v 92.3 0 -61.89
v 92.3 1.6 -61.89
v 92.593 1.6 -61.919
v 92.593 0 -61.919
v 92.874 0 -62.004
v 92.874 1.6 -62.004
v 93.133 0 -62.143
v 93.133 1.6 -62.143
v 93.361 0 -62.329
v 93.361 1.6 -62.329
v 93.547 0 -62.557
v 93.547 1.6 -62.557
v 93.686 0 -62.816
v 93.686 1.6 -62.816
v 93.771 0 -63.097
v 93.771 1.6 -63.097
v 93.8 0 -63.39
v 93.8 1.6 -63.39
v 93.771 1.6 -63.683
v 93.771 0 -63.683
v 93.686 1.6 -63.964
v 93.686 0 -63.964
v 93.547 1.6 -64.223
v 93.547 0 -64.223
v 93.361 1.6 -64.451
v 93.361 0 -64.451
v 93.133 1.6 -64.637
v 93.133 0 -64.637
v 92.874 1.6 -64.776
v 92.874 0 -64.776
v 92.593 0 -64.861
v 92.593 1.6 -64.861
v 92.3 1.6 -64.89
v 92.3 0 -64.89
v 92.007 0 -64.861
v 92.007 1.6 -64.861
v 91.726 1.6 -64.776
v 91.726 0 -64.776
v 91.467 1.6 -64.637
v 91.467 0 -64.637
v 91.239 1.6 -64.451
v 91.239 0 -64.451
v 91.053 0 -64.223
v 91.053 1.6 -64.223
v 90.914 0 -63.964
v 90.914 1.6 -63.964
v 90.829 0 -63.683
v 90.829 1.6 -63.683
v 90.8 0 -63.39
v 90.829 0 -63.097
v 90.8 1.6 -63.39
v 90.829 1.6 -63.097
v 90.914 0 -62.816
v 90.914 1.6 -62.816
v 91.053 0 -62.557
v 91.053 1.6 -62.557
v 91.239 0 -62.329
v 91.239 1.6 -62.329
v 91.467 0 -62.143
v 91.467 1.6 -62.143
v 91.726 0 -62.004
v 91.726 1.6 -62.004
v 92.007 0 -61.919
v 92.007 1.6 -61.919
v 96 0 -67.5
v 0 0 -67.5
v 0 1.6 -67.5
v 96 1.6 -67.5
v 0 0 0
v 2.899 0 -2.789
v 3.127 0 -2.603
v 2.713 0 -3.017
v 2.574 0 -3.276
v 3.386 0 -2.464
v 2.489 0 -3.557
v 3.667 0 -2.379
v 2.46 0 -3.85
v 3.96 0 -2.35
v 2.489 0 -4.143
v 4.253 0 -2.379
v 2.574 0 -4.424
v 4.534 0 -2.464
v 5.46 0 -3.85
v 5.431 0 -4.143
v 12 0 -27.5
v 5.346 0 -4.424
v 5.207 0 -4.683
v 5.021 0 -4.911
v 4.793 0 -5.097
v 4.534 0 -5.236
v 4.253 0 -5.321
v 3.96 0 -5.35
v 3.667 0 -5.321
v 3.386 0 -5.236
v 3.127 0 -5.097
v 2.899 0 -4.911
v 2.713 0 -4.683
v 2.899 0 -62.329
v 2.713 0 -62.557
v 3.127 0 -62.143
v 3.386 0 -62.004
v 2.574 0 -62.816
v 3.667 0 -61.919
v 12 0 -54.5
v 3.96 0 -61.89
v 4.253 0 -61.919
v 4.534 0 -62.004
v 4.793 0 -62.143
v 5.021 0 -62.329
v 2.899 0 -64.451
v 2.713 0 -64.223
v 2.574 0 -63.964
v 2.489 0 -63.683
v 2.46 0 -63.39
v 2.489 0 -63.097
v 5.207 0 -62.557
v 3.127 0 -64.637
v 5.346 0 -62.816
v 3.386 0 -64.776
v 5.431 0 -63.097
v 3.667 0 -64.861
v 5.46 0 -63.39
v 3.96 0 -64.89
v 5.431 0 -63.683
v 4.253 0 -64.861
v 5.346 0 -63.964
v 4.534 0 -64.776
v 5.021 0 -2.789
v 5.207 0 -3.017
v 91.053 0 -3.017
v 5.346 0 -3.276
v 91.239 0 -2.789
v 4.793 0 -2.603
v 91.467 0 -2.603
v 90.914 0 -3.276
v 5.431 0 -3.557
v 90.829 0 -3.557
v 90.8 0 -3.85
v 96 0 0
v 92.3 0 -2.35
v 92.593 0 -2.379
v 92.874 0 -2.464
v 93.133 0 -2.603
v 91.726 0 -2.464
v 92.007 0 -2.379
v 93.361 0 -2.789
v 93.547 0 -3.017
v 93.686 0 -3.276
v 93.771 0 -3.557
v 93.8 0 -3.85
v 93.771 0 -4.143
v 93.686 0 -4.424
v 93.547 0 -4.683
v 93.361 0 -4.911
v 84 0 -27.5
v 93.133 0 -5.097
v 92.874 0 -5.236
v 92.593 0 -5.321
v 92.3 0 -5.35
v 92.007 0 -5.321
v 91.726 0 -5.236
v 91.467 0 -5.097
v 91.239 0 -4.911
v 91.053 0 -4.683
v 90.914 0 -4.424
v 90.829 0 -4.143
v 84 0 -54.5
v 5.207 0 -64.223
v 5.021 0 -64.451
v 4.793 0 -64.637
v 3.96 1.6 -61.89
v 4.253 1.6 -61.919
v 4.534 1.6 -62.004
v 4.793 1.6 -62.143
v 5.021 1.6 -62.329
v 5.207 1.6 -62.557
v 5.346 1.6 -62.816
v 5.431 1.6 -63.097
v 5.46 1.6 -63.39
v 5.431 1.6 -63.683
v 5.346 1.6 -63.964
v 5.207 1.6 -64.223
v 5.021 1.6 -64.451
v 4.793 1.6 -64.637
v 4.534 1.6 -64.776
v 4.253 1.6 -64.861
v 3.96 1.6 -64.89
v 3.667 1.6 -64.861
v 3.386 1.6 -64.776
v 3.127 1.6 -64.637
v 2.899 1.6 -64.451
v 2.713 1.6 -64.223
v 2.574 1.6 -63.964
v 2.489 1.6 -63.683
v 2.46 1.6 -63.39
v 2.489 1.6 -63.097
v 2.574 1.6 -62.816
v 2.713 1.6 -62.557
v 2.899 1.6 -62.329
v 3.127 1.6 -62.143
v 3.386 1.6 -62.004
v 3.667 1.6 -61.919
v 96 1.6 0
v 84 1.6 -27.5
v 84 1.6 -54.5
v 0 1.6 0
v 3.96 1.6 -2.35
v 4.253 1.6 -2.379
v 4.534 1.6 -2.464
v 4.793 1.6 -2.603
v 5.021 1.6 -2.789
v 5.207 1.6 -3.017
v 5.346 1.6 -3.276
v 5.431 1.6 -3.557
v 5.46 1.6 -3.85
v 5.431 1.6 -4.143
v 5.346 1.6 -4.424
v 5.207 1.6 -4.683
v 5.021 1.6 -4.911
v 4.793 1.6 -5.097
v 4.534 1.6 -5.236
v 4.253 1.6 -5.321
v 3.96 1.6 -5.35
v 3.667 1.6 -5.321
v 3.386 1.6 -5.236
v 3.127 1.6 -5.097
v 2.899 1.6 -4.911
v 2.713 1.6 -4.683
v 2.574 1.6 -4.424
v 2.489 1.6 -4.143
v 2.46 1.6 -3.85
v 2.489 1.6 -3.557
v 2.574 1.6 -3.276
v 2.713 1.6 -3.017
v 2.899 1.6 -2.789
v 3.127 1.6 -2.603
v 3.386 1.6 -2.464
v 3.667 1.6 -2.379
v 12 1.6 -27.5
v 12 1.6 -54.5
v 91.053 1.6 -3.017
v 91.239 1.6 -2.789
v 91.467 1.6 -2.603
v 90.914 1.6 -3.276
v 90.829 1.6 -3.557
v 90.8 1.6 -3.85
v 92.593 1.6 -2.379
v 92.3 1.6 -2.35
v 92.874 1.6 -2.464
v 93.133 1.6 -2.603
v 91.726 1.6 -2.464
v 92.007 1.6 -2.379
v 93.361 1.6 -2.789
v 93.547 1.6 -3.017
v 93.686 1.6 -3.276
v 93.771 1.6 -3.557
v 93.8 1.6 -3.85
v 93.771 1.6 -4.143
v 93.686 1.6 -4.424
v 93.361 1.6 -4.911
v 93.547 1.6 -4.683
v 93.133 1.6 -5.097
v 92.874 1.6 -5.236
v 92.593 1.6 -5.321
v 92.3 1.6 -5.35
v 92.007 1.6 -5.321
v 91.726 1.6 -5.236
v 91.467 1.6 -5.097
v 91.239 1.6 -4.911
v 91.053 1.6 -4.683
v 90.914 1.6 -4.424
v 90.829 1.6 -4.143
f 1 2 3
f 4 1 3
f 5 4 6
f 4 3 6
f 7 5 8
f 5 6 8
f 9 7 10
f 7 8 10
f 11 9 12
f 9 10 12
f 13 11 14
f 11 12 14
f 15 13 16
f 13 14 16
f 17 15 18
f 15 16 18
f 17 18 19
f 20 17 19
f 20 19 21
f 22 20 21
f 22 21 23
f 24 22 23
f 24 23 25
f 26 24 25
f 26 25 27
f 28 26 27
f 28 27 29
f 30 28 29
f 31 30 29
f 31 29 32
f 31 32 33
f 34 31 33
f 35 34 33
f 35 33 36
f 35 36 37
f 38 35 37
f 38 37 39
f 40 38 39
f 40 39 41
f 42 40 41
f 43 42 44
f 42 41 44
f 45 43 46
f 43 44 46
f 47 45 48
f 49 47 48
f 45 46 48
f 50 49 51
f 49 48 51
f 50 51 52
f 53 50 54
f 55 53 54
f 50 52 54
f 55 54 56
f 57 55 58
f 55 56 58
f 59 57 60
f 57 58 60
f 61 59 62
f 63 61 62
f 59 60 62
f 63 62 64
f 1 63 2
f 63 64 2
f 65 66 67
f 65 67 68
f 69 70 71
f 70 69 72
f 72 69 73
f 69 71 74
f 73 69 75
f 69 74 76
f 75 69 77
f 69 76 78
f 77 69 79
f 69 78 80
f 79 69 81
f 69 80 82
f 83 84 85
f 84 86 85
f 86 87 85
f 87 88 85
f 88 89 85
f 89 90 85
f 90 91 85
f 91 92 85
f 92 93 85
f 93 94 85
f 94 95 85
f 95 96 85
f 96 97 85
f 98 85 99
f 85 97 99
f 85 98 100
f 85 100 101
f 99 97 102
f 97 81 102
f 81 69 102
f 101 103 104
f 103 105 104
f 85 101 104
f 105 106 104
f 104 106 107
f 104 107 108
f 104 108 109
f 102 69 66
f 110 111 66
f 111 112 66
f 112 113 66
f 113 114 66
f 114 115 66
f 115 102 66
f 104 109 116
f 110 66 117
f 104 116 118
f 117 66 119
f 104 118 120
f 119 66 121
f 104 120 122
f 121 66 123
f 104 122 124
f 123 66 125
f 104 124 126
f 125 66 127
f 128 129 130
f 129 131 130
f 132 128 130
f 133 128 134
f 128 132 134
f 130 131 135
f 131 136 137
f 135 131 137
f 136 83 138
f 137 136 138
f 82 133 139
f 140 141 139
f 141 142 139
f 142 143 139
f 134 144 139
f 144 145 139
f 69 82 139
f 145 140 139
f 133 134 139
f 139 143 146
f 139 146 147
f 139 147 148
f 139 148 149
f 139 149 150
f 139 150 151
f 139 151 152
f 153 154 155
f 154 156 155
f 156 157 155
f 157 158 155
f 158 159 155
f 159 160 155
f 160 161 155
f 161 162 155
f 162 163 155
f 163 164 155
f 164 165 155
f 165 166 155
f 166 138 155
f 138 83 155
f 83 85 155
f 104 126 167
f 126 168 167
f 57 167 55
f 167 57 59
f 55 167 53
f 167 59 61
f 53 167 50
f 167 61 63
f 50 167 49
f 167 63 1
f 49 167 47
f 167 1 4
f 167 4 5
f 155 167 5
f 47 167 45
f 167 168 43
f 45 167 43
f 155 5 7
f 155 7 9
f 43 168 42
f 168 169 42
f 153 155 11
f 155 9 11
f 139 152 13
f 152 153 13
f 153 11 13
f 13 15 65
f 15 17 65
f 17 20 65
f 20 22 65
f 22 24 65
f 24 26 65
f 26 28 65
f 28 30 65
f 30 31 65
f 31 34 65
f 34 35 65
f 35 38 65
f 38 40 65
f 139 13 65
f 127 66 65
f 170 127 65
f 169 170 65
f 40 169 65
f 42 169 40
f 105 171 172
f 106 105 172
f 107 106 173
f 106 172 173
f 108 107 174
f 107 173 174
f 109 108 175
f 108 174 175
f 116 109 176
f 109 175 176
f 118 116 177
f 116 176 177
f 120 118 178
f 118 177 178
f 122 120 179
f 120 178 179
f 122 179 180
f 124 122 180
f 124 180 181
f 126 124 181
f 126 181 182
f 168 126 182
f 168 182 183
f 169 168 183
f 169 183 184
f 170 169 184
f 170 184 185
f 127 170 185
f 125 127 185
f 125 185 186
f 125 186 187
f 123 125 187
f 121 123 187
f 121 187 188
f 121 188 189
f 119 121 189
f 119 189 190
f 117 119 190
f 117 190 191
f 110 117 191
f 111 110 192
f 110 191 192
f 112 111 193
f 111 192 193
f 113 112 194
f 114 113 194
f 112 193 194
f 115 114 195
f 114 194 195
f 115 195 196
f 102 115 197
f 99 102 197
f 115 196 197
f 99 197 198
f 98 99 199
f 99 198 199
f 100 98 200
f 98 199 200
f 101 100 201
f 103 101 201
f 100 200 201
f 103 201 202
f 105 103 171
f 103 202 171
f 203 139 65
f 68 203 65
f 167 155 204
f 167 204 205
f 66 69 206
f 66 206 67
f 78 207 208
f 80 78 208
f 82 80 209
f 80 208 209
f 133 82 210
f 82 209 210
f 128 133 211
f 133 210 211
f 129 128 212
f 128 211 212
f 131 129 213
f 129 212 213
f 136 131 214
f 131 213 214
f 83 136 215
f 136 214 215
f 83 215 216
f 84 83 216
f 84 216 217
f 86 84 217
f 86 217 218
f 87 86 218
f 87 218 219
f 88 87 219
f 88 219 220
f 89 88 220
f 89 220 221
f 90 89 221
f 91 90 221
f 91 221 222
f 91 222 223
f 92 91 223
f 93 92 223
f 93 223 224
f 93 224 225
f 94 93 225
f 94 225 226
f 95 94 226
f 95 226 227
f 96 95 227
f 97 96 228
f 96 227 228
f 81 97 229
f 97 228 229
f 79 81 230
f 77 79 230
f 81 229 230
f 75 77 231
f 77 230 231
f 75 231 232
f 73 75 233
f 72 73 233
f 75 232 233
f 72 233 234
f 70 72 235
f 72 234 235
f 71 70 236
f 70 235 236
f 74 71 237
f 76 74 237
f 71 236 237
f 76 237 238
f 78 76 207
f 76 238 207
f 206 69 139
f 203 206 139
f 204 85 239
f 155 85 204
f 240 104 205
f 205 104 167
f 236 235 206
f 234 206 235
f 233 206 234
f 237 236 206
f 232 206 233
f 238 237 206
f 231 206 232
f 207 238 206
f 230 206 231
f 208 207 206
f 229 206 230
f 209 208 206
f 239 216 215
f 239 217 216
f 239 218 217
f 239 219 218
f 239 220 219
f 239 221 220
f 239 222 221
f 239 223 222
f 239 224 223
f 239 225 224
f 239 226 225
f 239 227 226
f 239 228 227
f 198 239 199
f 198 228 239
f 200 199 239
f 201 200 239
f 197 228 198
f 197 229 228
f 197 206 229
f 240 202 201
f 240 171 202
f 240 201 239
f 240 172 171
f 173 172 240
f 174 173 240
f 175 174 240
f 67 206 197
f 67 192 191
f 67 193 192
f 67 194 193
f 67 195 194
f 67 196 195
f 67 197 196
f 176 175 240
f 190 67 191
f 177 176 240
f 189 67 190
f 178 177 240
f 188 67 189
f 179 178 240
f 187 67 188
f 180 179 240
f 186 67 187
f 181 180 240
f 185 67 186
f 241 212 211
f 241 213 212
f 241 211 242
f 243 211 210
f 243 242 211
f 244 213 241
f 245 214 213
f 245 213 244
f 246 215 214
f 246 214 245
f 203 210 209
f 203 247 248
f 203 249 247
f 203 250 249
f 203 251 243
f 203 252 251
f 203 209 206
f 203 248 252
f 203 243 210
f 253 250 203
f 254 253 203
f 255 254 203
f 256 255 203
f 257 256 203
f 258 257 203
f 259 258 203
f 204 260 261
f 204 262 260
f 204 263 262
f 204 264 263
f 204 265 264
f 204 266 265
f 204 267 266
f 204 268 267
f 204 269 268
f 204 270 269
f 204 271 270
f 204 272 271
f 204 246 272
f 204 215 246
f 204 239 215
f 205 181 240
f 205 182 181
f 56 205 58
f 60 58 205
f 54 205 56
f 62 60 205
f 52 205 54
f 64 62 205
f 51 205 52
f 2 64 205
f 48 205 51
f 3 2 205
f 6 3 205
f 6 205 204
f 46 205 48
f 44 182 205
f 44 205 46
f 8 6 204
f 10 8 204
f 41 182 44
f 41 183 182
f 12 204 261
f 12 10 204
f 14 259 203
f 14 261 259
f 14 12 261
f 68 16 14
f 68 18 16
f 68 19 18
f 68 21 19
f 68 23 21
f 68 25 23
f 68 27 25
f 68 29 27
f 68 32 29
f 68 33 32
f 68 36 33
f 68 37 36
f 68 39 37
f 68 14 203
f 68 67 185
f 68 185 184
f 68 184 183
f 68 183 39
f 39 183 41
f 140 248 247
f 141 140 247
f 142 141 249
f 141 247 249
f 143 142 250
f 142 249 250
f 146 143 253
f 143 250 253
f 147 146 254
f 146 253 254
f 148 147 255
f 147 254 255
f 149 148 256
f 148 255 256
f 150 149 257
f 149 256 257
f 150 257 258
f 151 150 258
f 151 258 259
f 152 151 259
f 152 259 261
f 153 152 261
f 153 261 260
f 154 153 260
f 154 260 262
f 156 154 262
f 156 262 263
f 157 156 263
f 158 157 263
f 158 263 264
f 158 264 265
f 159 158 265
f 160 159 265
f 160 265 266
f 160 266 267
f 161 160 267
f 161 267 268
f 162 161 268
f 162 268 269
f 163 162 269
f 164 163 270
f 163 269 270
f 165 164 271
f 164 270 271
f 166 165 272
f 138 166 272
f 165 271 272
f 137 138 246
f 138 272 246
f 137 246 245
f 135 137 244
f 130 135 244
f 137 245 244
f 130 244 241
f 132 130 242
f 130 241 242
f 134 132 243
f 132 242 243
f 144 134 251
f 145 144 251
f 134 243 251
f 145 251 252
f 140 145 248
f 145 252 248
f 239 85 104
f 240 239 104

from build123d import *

# Parameters (mm, degrees)
SKETCH1_W               = 96
SKETCH1_H               = 67.5
BOSS_EXTRUDE1_DEPTH     = 1.6
CUT_EXTRUDE1_REACH      = 119.366
SKETCH2_R               = 1.5
CUT_EXTRUDE2_DEPTH      = 118.366136513
CUT_EXTRUDE2_DEPTH_BACK = 118.366136513
SKETCH3_W               = 72
SKETCH3_H               = 27


with BuildPart() as part:
    # Sketch1 → Boss-Extrude1 (new body)
    with BuildSketch(Plane(origin=(0, 0, 0), x_dir=(1, 0, 0), z_dir=(0, 1, 0))):
        with Locations((48, 33.75)):
            Rectangle(SKETCH1_W, SKETCH1_H)
    extrude(amount=BOSS_EXTRUDE1_DEPTH)

    # Sketch2 → Cut-Extrude1 (cut, up to next)
    with BuildSketch(Plane(origin=(0, 1.6, 0), x_dir=(1, 0, 0), z_dir=(0, 1, 0)), mode=Mode.PRIVATE) as cut_extrude1_sk1:
        with Locations(Location((3.96, 3.85, 0), (0, 0, 270))):
            Circle(SKETCH2_R)
    cut_extrude1_tool1 = extrude(cut_extrude1_sk1.sketch, amount=-CUT_EXTRUDE1_REACH, mode=Mode.PRIVATE) & part.part
    # Sketch2 → Cut-Extrude1 (cut, up to next)
    with BuildSketch(Plane(origin=(0, 1.6, 0), x_dir=(1, 0, 0), z_dir=(0, 1, 0)), mode=Mode.PRIVATE) as cut_extrude1_sk2:
        with Locations(Location((92.3, 3.85, 0), (0, 0, 270))):
            Circle(SKETCH2_R)
    cut_extrude1_tool2 = extrude(cut_extrude1_sk2.sketch, amount=-CUT_EXTRUDE1_REACH, mode=Mode.PRIVATE) & part.part
    # Sketch2 → Cut-Extrude1 (cut, up to next)
    with BuildSketch(Plane(origin=(0, 1.6, 0), x_dir=(1, 0, 0), z_dir=(0, 1, 0)), mode=Mode.PRIVATE) as cut_extrude1_sk3:
        with Locations(Location((3.96, 63.39, 0), (0, 0, 270))):
            Circle(SKETCH2_R)
    cut_extrude1_tool3 = extrude(cut_extrude1_sk3.sketch, amount=-CUT_EXTRUDE1_REACH, mode=Mode.PRIVATE) & part.part
    # Sketch2 → Cut-Extrude1 (cut, up to next)
    with BuildSketch(Plane(origin=(0, 1.6, 0), x_dir=(1, 0, 0), z_dir=(0, 1, 0)), mode=Mode.PRIVATE) as cut_extrude1_sk4:
        with Locations(Location((92.3, 63.39, 0), (0, 0, 270))):
            Circle(SKETCH2_R)
    cut_extrude1_tool4 = extrude(cut_extrude1_sk4.sketch, amount=-CUT_EXTRUDE1_REACH, mode=Mode.PRIVATE) & part.part
    add(cut_extrude1_tool1.solids().sort_by_distance((3.96, 1.6, -3.85))[0], mode=Mode.SUBTRACT)
    add(cut_extrude1_tool2.solids().sort_by_distance((92.3, 1.6, -3.85))[0], mode=Mode.SUBTRACT)
    add(cut_extrude1_tool3.solids().sort_by_distance((3.96, 1.6, -63.39))[0], mode=Mode.SUBTRACT)
    add(cut_extrude1_tool4.solids().sort_by_distance((92.3, 1.6, -63.39))[0], mode=Mode.SUBTRACT)

    # Sketch3 → Cut-Extrude2 (cut, two sides: drawn at the far end of the back side and taken through both)
    with BuildSketch(Plane(origin=(0, 1.6, 0), x_dir=(1, 0, 0), z_dir=(0, 1, 0)).offset(-CUT_EXTRUDE2_DEPTH_BACK)):
        with Locations((48, 41)):
            Rectangle(SKETCH3_W, SKETCH3_H)
    extrude(amount=CUT_EXTRUDE2_DEPTH + CUT_EXTRUDE2_DEPTH_BACK, mode=Mode.SUBTRACT)


solid = part.part
